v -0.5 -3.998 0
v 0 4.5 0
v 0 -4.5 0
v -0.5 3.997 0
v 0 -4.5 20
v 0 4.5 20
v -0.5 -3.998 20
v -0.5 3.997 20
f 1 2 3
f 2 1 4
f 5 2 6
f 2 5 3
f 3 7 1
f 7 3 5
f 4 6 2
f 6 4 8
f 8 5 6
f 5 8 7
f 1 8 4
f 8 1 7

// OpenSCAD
// constants
vslot = 20;
vslot_groove = 1.0;//1.8
vslot_groove_outer = 9.00;
vslot_groove_inner = 6.99;

module groove(width, max_height=0)
{
    offset = (vslot_groove_outer - vslot_groove_inner) / 2;
	groove_points = [[0,0], [0,vslot_groove_outer], [-vslot_groove,vslot_groove_outer-offset], [-vslot_groove,offset]];
	
	difference()
	{
		translate([0,-vslot_groove_outer/2,0])
		linear_extrude(height = width)
			polygon (points=groove_points);
	
		if (max_height > 0)
		{
			yy=vslot_groove_outer+2;
			translate ([-vslot_groove-max_height,-yy/2,-1])
				cube([vslot_groove,yy,width+2]);
		}
	}
}

function groove_thickness() = vslot_groove;

//groove(20);
groove(20,max_height=0.5);
